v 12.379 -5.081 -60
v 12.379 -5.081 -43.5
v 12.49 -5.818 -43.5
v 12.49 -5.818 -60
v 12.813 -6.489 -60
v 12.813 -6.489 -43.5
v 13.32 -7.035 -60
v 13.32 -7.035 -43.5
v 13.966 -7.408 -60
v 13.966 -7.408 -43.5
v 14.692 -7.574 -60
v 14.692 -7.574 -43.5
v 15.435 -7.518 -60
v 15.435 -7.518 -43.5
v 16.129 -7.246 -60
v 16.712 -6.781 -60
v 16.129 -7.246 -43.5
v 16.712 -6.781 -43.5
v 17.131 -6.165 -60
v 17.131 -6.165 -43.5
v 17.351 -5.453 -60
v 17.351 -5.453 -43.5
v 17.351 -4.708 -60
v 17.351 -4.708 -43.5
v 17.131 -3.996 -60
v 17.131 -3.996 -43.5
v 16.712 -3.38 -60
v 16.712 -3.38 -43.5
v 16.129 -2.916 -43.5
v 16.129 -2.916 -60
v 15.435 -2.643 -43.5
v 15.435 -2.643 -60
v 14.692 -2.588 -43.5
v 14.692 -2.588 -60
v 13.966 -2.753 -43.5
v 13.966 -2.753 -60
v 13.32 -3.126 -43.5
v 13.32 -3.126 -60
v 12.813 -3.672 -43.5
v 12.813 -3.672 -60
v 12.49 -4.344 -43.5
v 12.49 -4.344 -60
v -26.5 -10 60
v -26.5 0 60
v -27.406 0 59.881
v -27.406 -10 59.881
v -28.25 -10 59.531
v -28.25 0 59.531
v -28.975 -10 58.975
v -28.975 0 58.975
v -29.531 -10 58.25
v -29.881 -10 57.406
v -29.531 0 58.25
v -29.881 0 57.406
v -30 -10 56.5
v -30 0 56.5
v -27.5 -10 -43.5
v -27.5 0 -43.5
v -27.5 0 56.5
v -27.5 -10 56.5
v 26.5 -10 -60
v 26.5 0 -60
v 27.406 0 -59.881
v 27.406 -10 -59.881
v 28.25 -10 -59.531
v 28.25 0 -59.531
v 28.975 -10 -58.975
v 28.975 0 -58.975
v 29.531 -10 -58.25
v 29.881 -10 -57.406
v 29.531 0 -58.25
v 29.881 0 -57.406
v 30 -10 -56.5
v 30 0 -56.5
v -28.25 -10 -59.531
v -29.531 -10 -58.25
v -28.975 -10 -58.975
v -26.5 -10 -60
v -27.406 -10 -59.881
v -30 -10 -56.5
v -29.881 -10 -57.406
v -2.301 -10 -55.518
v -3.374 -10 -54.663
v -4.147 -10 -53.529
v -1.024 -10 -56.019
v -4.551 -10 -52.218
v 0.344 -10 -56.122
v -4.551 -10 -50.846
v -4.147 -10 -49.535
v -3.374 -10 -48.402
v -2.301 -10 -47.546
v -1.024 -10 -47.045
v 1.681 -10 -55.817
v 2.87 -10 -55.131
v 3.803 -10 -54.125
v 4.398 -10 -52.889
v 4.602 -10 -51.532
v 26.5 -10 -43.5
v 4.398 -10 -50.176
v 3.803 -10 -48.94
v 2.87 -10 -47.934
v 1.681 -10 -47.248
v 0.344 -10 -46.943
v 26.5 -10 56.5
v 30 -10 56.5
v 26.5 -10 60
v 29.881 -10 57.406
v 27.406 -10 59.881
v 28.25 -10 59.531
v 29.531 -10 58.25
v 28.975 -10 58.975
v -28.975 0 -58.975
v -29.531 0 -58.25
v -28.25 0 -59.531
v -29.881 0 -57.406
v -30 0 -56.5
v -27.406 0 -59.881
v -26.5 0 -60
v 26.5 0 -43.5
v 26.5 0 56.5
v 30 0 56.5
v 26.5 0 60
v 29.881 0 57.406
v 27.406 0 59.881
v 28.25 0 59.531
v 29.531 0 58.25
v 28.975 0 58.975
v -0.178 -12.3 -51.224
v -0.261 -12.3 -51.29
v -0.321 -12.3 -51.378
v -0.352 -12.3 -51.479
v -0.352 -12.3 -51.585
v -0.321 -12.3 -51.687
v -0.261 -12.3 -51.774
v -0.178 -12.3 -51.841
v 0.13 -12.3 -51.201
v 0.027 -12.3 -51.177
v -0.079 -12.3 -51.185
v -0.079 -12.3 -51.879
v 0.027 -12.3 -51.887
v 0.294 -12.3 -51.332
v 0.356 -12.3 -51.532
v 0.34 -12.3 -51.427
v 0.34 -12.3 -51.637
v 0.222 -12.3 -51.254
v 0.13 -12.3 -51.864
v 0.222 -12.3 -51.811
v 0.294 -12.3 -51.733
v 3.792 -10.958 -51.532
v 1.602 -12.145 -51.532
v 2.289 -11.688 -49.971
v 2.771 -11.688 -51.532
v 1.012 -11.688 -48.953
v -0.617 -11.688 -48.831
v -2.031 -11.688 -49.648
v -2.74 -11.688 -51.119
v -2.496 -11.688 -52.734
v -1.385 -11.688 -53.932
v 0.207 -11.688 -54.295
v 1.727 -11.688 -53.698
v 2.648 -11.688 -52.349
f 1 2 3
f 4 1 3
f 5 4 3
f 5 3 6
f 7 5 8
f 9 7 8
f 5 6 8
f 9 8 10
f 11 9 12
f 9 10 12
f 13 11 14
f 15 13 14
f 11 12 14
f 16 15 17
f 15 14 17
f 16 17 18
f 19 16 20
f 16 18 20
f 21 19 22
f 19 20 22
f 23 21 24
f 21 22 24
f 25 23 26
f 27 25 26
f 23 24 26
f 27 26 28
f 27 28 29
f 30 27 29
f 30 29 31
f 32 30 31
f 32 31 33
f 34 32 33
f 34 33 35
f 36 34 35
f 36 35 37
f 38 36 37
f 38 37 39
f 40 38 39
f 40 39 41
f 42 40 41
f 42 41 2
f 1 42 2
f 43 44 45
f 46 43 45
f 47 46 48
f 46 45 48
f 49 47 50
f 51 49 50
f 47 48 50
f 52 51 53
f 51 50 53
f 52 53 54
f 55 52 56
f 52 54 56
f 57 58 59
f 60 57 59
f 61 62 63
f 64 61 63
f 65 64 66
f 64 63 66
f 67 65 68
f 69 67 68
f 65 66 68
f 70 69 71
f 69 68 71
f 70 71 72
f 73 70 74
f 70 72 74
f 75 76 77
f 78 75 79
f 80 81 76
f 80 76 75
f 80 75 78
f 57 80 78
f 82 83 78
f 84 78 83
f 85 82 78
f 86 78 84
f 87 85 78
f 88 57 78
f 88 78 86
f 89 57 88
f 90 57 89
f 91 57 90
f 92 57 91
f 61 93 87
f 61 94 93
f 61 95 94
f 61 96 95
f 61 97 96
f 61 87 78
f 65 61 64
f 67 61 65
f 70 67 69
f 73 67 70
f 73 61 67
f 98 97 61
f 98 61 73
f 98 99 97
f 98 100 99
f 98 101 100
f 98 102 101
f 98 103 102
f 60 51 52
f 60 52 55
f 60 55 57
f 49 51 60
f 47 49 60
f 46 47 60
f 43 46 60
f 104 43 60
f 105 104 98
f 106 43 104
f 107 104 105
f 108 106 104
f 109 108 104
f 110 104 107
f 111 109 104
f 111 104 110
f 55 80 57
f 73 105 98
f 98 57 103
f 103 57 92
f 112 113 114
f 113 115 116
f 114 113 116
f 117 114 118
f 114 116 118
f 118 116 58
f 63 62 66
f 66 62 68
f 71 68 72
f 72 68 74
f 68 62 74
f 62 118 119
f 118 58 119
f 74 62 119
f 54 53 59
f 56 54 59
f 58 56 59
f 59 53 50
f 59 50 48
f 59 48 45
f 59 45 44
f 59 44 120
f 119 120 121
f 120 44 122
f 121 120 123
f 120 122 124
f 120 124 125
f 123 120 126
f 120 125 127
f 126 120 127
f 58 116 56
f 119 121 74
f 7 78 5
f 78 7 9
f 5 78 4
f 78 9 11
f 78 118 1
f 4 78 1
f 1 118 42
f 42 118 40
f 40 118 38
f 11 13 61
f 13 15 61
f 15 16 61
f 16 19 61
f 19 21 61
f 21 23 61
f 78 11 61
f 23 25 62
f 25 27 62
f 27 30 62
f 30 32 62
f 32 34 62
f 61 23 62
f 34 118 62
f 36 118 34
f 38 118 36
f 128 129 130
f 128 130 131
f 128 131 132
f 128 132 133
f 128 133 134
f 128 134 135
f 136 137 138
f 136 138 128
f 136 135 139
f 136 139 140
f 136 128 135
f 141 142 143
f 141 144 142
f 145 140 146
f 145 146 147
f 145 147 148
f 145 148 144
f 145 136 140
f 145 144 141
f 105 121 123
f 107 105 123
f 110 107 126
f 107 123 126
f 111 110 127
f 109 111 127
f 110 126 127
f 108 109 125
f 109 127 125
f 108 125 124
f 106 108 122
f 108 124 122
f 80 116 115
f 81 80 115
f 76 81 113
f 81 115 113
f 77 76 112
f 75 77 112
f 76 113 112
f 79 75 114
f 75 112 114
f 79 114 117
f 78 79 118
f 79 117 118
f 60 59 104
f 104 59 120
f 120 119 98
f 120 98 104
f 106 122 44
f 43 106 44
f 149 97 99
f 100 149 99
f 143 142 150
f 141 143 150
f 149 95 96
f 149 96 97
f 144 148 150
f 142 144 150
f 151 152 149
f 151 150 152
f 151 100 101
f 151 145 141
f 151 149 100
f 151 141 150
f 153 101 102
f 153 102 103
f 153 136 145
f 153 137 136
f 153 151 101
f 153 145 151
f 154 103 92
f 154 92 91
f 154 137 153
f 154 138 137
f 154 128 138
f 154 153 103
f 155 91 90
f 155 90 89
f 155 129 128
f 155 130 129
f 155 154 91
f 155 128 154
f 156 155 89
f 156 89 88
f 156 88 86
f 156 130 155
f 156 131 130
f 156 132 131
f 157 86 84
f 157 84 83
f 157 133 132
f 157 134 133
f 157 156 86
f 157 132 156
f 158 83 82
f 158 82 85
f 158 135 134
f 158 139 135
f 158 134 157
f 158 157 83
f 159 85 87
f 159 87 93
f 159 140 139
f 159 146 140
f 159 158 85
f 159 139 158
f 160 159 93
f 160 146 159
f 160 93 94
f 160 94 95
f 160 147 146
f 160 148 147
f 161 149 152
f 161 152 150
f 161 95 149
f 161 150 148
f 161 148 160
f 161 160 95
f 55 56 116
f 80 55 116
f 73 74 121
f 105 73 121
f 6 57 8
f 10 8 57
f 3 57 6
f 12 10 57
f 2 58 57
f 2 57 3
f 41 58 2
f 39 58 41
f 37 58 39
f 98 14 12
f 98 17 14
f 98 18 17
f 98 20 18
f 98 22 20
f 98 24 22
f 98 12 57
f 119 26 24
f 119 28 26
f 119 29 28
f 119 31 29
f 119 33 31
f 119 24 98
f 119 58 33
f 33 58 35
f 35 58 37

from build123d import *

# Parameters (mm, degrees)
F0_W     = 54
F0_H     = 100
F1_DEPTH = 10
F2_R     = 4.602391418
F3_DEPTH = 2.3
F6_D     = 5
F6_DEPTH = 44
F6_TIP   = 1.5021515476


# Not quite as in the source:
# - a fillet or chamfer that OpenCascade refuses, or shapes differently, is made with other operations: its cross-section is extruded or revolved along the edge and cut away or added


with BuildPart() as f1:
    # F0 (on Front) → F1 (new body)
    with BuildSketch(Plane.XZ):
        with BuildLine():
            ThreePointArc((30, 56.5), (28.9748737342, 58.9748737342), (26.5, 60))
            Line((26.5, 60), (-26.5, 60))
            ThreePointArc((-26.5, 60), (-28.9748737342, 58.9748737342), (-30, 56.5))
            Line((-30, 56.5), (-30, -56.5))
            ThreePointArc((-30, -56.5), (-28.9748737342, -58.9748737342), (-26.5, -60))
            Line((-26.5, -60), (26.5, -60))
            ThreePointArc((26.5, -60), (28.9748737342, -58.9748737342), (30, -56.5))
            Line((30, -56.5), (30, 56.5))
        make_face()
        with Locations((-0.5, 6.5)):
            Rectangle(F0_W, F0_H, mode=Mode.SUBTRACT)
    extrude(amount=F1_DEPTH)

    # F2 (on face) → F3 (join)
    with BuildSketch(Plane.XZ.offset(10)):
        with Locations((0, -51.5322610736)):
            Circle(F2_R)
    extrude(amount=F3_DEPTH)

    # F4: fillet of radius 5.069848481 on 1 edges, made by hand

    # F4_s1 → F4_t2 (revolve, cut)
    with BuildSketch(Plane.XY.offset(-51.5322610736)):
        with BuildLine():
            ThreePointArc((4.602391418, -10), (2.7706699872, -11.6880700767), (0.356063238, -12.3))
            Line((0.356063238, -12.3), (4.602391418, -12.3))
            Line((4.602391418, -12.3), (4.602391418, -10))
        make_face()
    revolve(axis=Axis((0, -12.3, -51.5322610736), (0, -1, 0)), mode=Mode.SUBTRACT)

    # F6
    with Locations(Plane(origin=(0, 0, -60), x_dir=(1, 0, 0), z_dir=(0, 0, -1))):
        with Locations((14.8790339008, 5.0806454383)):
            Hole(F6_D / 2, depth=F6_DEPTH)
            with Locations((0, 0, -(F6_DEPTH + F6_TIP / 2))):  # 118° drill point
                Cone(0, F6_D / 2, F6_TIP, mode=Mode.SUBTRACT)


solid = f1.part
